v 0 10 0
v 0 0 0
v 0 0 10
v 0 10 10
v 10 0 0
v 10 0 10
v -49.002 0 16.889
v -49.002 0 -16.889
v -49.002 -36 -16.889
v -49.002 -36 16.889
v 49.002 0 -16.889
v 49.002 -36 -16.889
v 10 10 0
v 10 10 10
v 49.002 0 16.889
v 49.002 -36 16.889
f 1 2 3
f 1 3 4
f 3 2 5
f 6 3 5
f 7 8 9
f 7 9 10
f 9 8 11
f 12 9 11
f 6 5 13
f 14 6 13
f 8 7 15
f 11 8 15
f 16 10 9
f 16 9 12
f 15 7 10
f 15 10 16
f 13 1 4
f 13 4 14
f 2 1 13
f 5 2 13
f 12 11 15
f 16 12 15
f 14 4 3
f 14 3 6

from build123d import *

# Parameters (mm, degrees)
SKETCH_W  = 98.003342
SKETCH_H  = 33.777028
PAD_DEPTH = 36
BOX_W     = 10
BOX_H     = 10
BOX_DEPTH = 10


with BuildPart() as body:
    # Sketch → Pad (new body)
    with BuildSketch(Plane.XZ):
        Rectangle(SKETCH_W, SKETCH_H)
    extrude(amount=PAD_DEPTH)


with BuildPart() as cube:
    # Box → Box (new body)
    with BuildSketch(Plane.XY):
        with Locations((5, 5)):
            Rectangle(BOX_W, BOX_H)
    extrude(amount=BOX_DEPTH)


solid = Compound([body.part, cube.part])
